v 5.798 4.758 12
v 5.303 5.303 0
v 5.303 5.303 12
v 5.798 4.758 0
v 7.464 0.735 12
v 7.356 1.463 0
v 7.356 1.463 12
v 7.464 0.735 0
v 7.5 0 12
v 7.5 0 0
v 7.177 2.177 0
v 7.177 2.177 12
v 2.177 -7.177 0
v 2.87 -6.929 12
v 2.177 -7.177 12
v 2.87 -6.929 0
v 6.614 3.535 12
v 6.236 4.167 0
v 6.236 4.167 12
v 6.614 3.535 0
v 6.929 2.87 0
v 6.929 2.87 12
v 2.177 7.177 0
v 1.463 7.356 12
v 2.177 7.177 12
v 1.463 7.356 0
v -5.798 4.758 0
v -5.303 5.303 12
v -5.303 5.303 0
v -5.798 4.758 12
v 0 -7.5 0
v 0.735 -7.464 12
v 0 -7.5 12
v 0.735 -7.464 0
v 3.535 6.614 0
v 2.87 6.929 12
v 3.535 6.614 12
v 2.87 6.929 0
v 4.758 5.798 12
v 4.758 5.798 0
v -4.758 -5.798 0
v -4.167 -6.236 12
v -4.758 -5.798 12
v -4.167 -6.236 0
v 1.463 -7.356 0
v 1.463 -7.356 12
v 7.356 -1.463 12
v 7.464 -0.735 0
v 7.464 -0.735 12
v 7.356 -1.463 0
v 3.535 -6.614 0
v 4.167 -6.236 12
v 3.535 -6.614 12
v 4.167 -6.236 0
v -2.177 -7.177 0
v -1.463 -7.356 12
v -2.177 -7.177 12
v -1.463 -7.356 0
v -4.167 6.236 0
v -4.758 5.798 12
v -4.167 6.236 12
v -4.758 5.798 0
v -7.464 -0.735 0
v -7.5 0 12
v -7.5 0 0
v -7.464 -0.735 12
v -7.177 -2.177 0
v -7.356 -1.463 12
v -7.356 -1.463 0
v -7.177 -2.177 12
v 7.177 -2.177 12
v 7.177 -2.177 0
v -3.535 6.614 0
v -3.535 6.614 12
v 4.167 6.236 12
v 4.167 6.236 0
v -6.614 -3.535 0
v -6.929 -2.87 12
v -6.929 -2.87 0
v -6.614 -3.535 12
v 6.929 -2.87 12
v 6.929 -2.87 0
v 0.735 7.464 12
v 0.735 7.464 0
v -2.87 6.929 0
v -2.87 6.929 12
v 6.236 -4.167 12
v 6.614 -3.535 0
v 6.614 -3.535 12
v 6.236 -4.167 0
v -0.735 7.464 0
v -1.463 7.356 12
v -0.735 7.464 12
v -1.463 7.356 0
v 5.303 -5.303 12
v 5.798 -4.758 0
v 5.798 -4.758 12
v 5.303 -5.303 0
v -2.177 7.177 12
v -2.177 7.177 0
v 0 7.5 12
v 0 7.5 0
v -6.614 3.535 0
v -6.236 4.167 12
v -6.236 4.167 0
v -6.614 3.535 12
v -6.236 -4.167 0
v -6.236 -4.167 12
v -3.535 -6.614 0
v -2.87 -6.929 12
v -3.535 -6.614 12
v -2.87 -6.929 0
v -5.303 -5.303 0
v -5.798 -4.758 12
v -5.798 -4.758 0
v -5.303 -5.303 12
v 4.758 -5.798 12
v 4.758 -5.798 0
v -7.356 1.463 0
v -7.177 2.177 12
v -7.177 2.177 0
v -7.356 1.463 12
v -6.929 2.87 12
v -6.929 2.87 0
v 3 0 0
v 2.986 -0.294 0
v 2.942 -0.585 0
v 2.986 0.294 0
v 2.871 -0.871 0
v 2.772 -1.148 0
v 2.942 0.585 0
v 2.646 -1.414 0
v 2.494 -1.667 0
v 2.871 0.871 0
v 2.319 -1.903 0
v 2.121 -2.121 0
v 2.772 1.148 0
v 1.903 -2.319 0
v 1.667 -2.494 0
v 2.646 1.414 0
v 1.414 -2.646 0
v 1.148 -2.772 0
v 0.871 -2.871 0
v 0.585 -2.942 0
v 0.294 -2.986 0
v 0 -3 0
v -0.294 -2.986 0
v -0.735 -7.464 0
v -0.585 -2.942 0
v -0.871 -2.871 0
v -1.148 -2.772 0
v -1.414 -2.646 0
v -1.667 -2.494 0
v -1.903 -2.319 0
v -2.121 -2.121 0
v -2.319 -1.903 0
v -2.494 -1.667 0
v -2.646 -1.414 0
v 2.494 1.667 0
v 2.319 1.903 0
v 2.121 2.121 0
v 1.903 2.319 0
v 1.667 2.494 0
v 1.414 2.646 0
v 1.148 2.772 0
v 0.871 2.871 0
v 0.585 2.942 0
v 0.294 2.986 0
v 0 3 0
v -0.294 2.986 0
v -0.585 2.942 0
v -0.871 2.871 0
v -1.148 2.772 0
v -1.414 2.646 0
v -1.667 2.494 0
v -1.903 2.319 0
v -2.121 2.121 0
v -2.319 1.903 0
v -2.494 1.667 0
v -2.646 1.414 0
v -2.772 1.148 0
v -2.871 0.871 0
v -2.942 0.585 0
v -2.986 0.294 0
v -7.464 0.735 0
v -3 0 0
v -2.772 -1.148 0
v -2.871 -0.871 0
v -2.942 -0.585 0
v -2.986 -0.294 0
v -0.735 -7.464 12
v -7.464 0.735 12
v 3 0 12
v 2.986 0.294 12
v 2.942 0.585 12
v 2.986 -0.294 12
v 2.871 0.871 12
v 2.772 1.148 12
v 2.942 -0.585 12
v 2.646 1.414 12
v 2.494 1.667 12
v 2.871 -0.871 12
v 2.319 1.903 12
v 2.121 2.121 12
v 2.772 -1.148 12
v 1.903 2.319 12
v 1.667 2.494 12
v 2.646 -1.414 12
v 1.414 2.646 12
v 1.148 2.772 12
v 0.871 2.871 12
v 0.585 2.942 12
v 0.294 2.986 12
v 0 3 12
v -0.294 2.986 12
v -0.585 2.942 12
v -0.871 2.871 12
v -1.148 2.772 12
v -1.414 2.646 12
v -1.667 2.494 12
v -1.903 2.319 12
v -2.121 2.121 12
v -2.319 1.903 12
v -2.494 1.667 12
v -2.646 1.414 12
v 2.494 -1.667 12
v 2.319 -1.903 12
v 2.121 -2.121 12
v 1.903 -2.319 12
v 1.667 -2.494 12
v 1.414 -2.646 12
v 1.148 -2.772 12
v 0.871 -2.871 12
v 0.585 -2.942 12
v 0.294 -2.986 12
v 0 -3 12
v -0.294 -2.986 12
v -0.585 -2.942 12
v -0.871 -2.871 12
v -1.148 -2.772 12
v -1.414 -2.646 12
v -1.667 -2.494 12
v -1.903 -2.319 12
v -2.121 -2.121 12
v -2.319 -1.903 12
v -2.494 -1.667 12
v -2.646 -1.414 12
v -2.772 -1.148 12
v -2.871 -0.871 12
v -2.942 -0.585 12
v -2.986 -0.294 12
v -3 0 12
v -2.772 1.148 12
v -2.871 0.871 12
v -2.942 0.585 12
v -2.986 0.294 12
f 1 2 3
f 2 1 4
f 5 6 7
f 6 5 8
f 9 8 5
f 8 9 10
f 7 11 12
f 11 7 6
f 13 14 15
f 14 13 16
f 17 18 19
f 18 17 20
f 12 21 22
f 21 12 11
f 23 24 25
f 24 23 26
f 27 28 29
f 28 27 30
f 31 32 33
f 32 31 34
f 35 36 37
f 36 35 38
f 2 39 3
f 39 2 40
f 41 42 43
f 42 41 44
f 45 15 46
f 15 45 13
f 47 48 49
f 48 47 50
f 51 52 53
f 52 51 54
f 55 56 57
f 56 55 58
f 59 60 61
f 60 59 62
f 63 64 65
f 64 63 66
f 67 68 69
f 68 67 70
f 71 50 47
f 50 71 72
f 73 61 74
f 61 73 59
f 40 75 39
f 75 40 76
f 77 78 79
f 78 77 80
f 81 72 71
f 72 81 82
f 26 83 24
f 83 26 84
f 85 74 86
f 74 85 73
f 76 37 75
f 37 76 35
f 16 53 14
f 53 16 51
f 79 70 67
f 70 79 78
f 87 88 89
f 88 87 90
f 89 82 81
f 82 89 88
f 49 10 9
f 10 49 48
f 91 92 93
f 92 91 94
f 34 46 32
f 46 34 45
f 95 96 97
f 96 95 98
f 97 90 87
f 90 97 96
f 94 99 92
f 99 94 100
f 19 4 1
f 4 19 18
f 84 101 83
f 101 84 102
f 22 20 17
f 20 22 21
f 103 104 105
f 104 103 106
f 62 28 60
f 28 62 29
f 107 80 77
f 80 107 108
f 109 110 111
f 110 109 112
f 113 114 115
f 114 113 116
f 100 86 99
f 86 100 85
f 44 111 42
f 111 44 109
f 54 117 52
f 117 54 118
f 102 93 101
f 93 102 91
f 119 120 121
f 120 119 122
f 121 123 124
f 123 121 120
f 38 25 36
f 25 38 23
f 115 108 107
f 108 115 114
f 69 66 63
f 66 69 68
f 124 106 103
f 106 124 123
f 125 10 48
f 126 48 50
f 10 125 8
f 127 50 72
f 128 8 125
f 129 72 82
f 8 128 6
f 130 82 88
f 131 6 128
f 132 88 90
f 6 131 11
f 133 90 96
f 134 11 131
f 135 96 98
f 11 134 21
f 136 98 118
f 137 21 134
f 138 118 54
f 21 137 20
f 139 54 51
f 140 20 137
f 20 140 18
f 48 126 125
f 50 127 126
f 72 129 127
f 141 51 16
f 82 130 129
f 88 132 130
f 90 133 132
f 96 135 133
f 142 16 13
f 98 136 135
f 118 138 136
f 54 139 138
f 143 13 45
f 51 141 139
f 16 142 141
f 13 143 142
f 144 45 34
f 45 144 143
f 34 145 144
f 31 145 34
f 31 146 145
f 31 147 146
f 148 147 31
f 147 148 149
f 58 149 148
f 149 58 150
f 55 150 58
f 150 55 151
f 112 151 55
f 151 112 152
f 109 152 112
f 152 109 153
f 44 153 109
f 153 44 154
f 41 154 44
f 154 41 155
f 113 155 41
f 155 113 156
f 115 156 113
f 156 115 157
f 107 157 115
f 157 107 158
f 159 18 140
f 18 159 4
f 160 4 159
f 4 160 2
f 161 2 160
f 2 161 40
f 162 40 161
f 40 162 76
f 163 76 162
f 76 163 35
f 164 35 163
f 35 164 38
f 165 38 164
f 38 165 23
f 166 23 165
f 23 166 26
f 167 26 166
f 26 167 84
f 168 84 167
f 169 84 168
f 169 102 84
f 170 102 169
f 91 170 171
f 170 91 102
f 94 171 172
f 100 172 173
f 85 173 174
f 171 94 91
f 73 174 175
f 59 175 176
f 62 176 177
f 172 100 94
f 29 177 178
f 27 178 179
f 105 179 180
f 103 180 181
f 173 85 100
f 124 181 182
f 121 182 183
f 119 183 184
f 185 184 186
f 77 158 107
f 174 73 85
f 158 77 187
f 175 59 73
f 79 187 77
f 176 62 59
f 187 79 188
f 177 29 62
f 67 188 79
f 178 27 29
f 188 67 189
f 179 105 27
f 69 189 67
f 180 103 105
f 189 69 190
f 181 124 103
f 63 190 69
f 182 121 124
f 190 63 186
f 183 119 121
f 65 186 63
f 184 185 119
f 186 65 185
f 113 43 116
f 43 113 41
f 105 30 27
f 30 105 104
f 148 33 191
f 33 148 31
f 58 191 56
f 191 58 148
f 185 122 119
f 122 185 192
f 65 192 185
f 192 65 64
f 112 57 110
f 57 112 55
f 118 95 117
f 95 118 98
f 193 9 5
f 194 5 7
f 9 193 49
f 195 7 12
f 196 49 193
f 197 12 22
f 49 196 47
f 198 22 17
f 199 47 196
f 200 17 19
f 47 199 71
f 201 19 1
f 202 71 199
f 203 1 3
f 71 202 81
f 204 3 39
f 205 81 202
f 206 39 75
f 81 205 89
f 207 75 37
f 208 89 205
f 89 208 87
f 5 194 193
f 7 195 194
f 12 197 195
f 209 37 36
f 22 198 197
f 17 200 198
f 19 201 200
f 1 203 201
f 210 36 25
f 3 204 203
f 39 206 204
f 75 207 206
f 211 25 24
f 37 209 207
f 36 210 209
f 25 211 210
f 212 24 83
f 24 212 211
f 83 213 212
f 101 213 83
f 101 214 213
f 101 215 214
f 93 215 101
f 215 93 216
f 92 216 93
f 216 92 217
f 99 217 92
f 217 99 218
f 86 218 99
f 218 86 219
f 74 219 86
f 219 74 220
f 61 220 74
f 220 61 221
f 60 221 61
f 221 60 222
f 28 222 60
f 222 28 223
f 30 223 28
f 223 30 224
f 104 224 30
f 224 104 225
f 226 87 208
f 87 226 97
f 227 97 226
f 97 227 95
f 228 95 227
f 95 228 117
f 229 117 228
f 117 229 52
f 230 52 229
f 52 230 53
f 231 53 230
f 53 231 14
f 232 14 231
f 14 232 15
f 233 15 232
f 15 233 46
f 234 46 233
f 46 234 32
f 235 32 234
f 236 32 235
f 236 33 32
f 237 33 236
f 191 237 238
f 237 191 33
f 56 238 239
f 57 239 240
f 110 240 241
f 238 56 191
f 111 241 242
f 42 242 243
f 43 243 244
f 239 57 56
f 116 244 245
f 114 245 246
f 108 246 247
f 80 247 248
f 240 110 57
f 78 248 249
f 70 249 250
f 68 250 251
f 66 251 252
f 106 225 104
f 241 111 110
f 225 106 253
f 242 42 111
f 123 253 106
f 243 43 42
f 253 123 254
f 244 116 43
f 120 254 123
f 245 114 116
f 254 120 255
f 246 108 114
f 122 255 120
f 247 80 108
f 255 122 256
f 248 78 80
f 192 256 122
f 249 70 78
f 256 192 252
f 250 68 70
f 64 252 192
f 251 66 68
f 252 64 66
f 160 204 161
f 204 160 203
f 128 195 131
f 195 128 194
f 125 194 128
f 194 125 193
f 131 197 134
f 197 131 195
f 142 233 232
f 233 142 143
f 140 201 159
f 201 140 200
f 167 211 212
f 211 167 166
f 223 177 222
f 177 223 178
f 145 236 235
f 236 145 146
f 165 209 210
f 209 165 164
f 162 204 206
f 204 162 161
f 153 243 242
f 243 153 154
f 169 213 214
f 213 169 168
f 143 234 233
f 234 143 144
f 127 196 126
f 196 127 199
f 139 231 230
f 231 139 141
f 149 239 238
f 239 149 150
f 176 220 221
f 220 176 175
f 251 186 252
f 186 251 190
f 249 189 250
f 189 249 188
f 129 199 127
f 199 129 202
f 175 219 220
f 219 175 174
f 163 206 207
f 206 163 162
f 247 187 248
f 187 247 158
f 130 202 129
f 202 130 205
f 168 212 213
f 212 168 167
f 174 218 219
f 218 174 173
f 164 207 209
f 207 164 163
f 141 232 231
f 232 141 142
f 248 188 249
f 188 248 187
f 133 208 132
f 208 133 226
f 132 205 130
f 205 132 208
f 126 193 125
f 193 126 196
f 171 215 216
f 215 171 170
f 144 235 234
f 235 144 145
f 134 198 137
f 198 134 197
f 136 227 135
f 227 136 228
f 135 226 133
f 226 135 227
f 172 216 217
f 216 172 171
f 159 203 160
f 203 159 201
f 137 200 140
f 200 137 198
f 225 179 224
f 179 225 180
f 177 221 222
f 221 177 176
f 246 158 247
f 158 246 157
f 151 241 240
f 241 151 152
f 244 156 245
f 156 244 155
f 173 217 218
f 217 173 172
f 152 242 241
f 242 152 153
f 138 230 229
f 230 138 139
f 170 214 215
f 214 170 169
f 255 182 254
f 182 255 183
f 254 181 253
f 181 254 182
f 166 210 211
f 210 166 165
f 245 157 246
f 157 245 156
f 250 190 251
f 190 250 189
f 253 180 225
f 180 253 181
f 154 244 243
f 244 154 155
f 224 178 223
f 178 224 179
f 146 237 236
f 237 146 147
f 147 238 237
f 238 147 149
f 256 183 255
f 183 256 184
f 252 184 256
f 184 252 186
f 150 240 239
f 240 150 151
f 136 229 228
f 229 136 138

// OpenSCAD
module threaded_heat_set_insert() {
    difference() {
        // Outer cylinder
        cylinder(h=12.0, d=15.0, $fn=64);
        
        // Inner threaded hole for 6.0mm screws
        translate([0, 0, -1]) {
            cylinder(h=14.0, d=6.0, $fn=64);
        }
    }
}

threaded_heat_set_insert();
